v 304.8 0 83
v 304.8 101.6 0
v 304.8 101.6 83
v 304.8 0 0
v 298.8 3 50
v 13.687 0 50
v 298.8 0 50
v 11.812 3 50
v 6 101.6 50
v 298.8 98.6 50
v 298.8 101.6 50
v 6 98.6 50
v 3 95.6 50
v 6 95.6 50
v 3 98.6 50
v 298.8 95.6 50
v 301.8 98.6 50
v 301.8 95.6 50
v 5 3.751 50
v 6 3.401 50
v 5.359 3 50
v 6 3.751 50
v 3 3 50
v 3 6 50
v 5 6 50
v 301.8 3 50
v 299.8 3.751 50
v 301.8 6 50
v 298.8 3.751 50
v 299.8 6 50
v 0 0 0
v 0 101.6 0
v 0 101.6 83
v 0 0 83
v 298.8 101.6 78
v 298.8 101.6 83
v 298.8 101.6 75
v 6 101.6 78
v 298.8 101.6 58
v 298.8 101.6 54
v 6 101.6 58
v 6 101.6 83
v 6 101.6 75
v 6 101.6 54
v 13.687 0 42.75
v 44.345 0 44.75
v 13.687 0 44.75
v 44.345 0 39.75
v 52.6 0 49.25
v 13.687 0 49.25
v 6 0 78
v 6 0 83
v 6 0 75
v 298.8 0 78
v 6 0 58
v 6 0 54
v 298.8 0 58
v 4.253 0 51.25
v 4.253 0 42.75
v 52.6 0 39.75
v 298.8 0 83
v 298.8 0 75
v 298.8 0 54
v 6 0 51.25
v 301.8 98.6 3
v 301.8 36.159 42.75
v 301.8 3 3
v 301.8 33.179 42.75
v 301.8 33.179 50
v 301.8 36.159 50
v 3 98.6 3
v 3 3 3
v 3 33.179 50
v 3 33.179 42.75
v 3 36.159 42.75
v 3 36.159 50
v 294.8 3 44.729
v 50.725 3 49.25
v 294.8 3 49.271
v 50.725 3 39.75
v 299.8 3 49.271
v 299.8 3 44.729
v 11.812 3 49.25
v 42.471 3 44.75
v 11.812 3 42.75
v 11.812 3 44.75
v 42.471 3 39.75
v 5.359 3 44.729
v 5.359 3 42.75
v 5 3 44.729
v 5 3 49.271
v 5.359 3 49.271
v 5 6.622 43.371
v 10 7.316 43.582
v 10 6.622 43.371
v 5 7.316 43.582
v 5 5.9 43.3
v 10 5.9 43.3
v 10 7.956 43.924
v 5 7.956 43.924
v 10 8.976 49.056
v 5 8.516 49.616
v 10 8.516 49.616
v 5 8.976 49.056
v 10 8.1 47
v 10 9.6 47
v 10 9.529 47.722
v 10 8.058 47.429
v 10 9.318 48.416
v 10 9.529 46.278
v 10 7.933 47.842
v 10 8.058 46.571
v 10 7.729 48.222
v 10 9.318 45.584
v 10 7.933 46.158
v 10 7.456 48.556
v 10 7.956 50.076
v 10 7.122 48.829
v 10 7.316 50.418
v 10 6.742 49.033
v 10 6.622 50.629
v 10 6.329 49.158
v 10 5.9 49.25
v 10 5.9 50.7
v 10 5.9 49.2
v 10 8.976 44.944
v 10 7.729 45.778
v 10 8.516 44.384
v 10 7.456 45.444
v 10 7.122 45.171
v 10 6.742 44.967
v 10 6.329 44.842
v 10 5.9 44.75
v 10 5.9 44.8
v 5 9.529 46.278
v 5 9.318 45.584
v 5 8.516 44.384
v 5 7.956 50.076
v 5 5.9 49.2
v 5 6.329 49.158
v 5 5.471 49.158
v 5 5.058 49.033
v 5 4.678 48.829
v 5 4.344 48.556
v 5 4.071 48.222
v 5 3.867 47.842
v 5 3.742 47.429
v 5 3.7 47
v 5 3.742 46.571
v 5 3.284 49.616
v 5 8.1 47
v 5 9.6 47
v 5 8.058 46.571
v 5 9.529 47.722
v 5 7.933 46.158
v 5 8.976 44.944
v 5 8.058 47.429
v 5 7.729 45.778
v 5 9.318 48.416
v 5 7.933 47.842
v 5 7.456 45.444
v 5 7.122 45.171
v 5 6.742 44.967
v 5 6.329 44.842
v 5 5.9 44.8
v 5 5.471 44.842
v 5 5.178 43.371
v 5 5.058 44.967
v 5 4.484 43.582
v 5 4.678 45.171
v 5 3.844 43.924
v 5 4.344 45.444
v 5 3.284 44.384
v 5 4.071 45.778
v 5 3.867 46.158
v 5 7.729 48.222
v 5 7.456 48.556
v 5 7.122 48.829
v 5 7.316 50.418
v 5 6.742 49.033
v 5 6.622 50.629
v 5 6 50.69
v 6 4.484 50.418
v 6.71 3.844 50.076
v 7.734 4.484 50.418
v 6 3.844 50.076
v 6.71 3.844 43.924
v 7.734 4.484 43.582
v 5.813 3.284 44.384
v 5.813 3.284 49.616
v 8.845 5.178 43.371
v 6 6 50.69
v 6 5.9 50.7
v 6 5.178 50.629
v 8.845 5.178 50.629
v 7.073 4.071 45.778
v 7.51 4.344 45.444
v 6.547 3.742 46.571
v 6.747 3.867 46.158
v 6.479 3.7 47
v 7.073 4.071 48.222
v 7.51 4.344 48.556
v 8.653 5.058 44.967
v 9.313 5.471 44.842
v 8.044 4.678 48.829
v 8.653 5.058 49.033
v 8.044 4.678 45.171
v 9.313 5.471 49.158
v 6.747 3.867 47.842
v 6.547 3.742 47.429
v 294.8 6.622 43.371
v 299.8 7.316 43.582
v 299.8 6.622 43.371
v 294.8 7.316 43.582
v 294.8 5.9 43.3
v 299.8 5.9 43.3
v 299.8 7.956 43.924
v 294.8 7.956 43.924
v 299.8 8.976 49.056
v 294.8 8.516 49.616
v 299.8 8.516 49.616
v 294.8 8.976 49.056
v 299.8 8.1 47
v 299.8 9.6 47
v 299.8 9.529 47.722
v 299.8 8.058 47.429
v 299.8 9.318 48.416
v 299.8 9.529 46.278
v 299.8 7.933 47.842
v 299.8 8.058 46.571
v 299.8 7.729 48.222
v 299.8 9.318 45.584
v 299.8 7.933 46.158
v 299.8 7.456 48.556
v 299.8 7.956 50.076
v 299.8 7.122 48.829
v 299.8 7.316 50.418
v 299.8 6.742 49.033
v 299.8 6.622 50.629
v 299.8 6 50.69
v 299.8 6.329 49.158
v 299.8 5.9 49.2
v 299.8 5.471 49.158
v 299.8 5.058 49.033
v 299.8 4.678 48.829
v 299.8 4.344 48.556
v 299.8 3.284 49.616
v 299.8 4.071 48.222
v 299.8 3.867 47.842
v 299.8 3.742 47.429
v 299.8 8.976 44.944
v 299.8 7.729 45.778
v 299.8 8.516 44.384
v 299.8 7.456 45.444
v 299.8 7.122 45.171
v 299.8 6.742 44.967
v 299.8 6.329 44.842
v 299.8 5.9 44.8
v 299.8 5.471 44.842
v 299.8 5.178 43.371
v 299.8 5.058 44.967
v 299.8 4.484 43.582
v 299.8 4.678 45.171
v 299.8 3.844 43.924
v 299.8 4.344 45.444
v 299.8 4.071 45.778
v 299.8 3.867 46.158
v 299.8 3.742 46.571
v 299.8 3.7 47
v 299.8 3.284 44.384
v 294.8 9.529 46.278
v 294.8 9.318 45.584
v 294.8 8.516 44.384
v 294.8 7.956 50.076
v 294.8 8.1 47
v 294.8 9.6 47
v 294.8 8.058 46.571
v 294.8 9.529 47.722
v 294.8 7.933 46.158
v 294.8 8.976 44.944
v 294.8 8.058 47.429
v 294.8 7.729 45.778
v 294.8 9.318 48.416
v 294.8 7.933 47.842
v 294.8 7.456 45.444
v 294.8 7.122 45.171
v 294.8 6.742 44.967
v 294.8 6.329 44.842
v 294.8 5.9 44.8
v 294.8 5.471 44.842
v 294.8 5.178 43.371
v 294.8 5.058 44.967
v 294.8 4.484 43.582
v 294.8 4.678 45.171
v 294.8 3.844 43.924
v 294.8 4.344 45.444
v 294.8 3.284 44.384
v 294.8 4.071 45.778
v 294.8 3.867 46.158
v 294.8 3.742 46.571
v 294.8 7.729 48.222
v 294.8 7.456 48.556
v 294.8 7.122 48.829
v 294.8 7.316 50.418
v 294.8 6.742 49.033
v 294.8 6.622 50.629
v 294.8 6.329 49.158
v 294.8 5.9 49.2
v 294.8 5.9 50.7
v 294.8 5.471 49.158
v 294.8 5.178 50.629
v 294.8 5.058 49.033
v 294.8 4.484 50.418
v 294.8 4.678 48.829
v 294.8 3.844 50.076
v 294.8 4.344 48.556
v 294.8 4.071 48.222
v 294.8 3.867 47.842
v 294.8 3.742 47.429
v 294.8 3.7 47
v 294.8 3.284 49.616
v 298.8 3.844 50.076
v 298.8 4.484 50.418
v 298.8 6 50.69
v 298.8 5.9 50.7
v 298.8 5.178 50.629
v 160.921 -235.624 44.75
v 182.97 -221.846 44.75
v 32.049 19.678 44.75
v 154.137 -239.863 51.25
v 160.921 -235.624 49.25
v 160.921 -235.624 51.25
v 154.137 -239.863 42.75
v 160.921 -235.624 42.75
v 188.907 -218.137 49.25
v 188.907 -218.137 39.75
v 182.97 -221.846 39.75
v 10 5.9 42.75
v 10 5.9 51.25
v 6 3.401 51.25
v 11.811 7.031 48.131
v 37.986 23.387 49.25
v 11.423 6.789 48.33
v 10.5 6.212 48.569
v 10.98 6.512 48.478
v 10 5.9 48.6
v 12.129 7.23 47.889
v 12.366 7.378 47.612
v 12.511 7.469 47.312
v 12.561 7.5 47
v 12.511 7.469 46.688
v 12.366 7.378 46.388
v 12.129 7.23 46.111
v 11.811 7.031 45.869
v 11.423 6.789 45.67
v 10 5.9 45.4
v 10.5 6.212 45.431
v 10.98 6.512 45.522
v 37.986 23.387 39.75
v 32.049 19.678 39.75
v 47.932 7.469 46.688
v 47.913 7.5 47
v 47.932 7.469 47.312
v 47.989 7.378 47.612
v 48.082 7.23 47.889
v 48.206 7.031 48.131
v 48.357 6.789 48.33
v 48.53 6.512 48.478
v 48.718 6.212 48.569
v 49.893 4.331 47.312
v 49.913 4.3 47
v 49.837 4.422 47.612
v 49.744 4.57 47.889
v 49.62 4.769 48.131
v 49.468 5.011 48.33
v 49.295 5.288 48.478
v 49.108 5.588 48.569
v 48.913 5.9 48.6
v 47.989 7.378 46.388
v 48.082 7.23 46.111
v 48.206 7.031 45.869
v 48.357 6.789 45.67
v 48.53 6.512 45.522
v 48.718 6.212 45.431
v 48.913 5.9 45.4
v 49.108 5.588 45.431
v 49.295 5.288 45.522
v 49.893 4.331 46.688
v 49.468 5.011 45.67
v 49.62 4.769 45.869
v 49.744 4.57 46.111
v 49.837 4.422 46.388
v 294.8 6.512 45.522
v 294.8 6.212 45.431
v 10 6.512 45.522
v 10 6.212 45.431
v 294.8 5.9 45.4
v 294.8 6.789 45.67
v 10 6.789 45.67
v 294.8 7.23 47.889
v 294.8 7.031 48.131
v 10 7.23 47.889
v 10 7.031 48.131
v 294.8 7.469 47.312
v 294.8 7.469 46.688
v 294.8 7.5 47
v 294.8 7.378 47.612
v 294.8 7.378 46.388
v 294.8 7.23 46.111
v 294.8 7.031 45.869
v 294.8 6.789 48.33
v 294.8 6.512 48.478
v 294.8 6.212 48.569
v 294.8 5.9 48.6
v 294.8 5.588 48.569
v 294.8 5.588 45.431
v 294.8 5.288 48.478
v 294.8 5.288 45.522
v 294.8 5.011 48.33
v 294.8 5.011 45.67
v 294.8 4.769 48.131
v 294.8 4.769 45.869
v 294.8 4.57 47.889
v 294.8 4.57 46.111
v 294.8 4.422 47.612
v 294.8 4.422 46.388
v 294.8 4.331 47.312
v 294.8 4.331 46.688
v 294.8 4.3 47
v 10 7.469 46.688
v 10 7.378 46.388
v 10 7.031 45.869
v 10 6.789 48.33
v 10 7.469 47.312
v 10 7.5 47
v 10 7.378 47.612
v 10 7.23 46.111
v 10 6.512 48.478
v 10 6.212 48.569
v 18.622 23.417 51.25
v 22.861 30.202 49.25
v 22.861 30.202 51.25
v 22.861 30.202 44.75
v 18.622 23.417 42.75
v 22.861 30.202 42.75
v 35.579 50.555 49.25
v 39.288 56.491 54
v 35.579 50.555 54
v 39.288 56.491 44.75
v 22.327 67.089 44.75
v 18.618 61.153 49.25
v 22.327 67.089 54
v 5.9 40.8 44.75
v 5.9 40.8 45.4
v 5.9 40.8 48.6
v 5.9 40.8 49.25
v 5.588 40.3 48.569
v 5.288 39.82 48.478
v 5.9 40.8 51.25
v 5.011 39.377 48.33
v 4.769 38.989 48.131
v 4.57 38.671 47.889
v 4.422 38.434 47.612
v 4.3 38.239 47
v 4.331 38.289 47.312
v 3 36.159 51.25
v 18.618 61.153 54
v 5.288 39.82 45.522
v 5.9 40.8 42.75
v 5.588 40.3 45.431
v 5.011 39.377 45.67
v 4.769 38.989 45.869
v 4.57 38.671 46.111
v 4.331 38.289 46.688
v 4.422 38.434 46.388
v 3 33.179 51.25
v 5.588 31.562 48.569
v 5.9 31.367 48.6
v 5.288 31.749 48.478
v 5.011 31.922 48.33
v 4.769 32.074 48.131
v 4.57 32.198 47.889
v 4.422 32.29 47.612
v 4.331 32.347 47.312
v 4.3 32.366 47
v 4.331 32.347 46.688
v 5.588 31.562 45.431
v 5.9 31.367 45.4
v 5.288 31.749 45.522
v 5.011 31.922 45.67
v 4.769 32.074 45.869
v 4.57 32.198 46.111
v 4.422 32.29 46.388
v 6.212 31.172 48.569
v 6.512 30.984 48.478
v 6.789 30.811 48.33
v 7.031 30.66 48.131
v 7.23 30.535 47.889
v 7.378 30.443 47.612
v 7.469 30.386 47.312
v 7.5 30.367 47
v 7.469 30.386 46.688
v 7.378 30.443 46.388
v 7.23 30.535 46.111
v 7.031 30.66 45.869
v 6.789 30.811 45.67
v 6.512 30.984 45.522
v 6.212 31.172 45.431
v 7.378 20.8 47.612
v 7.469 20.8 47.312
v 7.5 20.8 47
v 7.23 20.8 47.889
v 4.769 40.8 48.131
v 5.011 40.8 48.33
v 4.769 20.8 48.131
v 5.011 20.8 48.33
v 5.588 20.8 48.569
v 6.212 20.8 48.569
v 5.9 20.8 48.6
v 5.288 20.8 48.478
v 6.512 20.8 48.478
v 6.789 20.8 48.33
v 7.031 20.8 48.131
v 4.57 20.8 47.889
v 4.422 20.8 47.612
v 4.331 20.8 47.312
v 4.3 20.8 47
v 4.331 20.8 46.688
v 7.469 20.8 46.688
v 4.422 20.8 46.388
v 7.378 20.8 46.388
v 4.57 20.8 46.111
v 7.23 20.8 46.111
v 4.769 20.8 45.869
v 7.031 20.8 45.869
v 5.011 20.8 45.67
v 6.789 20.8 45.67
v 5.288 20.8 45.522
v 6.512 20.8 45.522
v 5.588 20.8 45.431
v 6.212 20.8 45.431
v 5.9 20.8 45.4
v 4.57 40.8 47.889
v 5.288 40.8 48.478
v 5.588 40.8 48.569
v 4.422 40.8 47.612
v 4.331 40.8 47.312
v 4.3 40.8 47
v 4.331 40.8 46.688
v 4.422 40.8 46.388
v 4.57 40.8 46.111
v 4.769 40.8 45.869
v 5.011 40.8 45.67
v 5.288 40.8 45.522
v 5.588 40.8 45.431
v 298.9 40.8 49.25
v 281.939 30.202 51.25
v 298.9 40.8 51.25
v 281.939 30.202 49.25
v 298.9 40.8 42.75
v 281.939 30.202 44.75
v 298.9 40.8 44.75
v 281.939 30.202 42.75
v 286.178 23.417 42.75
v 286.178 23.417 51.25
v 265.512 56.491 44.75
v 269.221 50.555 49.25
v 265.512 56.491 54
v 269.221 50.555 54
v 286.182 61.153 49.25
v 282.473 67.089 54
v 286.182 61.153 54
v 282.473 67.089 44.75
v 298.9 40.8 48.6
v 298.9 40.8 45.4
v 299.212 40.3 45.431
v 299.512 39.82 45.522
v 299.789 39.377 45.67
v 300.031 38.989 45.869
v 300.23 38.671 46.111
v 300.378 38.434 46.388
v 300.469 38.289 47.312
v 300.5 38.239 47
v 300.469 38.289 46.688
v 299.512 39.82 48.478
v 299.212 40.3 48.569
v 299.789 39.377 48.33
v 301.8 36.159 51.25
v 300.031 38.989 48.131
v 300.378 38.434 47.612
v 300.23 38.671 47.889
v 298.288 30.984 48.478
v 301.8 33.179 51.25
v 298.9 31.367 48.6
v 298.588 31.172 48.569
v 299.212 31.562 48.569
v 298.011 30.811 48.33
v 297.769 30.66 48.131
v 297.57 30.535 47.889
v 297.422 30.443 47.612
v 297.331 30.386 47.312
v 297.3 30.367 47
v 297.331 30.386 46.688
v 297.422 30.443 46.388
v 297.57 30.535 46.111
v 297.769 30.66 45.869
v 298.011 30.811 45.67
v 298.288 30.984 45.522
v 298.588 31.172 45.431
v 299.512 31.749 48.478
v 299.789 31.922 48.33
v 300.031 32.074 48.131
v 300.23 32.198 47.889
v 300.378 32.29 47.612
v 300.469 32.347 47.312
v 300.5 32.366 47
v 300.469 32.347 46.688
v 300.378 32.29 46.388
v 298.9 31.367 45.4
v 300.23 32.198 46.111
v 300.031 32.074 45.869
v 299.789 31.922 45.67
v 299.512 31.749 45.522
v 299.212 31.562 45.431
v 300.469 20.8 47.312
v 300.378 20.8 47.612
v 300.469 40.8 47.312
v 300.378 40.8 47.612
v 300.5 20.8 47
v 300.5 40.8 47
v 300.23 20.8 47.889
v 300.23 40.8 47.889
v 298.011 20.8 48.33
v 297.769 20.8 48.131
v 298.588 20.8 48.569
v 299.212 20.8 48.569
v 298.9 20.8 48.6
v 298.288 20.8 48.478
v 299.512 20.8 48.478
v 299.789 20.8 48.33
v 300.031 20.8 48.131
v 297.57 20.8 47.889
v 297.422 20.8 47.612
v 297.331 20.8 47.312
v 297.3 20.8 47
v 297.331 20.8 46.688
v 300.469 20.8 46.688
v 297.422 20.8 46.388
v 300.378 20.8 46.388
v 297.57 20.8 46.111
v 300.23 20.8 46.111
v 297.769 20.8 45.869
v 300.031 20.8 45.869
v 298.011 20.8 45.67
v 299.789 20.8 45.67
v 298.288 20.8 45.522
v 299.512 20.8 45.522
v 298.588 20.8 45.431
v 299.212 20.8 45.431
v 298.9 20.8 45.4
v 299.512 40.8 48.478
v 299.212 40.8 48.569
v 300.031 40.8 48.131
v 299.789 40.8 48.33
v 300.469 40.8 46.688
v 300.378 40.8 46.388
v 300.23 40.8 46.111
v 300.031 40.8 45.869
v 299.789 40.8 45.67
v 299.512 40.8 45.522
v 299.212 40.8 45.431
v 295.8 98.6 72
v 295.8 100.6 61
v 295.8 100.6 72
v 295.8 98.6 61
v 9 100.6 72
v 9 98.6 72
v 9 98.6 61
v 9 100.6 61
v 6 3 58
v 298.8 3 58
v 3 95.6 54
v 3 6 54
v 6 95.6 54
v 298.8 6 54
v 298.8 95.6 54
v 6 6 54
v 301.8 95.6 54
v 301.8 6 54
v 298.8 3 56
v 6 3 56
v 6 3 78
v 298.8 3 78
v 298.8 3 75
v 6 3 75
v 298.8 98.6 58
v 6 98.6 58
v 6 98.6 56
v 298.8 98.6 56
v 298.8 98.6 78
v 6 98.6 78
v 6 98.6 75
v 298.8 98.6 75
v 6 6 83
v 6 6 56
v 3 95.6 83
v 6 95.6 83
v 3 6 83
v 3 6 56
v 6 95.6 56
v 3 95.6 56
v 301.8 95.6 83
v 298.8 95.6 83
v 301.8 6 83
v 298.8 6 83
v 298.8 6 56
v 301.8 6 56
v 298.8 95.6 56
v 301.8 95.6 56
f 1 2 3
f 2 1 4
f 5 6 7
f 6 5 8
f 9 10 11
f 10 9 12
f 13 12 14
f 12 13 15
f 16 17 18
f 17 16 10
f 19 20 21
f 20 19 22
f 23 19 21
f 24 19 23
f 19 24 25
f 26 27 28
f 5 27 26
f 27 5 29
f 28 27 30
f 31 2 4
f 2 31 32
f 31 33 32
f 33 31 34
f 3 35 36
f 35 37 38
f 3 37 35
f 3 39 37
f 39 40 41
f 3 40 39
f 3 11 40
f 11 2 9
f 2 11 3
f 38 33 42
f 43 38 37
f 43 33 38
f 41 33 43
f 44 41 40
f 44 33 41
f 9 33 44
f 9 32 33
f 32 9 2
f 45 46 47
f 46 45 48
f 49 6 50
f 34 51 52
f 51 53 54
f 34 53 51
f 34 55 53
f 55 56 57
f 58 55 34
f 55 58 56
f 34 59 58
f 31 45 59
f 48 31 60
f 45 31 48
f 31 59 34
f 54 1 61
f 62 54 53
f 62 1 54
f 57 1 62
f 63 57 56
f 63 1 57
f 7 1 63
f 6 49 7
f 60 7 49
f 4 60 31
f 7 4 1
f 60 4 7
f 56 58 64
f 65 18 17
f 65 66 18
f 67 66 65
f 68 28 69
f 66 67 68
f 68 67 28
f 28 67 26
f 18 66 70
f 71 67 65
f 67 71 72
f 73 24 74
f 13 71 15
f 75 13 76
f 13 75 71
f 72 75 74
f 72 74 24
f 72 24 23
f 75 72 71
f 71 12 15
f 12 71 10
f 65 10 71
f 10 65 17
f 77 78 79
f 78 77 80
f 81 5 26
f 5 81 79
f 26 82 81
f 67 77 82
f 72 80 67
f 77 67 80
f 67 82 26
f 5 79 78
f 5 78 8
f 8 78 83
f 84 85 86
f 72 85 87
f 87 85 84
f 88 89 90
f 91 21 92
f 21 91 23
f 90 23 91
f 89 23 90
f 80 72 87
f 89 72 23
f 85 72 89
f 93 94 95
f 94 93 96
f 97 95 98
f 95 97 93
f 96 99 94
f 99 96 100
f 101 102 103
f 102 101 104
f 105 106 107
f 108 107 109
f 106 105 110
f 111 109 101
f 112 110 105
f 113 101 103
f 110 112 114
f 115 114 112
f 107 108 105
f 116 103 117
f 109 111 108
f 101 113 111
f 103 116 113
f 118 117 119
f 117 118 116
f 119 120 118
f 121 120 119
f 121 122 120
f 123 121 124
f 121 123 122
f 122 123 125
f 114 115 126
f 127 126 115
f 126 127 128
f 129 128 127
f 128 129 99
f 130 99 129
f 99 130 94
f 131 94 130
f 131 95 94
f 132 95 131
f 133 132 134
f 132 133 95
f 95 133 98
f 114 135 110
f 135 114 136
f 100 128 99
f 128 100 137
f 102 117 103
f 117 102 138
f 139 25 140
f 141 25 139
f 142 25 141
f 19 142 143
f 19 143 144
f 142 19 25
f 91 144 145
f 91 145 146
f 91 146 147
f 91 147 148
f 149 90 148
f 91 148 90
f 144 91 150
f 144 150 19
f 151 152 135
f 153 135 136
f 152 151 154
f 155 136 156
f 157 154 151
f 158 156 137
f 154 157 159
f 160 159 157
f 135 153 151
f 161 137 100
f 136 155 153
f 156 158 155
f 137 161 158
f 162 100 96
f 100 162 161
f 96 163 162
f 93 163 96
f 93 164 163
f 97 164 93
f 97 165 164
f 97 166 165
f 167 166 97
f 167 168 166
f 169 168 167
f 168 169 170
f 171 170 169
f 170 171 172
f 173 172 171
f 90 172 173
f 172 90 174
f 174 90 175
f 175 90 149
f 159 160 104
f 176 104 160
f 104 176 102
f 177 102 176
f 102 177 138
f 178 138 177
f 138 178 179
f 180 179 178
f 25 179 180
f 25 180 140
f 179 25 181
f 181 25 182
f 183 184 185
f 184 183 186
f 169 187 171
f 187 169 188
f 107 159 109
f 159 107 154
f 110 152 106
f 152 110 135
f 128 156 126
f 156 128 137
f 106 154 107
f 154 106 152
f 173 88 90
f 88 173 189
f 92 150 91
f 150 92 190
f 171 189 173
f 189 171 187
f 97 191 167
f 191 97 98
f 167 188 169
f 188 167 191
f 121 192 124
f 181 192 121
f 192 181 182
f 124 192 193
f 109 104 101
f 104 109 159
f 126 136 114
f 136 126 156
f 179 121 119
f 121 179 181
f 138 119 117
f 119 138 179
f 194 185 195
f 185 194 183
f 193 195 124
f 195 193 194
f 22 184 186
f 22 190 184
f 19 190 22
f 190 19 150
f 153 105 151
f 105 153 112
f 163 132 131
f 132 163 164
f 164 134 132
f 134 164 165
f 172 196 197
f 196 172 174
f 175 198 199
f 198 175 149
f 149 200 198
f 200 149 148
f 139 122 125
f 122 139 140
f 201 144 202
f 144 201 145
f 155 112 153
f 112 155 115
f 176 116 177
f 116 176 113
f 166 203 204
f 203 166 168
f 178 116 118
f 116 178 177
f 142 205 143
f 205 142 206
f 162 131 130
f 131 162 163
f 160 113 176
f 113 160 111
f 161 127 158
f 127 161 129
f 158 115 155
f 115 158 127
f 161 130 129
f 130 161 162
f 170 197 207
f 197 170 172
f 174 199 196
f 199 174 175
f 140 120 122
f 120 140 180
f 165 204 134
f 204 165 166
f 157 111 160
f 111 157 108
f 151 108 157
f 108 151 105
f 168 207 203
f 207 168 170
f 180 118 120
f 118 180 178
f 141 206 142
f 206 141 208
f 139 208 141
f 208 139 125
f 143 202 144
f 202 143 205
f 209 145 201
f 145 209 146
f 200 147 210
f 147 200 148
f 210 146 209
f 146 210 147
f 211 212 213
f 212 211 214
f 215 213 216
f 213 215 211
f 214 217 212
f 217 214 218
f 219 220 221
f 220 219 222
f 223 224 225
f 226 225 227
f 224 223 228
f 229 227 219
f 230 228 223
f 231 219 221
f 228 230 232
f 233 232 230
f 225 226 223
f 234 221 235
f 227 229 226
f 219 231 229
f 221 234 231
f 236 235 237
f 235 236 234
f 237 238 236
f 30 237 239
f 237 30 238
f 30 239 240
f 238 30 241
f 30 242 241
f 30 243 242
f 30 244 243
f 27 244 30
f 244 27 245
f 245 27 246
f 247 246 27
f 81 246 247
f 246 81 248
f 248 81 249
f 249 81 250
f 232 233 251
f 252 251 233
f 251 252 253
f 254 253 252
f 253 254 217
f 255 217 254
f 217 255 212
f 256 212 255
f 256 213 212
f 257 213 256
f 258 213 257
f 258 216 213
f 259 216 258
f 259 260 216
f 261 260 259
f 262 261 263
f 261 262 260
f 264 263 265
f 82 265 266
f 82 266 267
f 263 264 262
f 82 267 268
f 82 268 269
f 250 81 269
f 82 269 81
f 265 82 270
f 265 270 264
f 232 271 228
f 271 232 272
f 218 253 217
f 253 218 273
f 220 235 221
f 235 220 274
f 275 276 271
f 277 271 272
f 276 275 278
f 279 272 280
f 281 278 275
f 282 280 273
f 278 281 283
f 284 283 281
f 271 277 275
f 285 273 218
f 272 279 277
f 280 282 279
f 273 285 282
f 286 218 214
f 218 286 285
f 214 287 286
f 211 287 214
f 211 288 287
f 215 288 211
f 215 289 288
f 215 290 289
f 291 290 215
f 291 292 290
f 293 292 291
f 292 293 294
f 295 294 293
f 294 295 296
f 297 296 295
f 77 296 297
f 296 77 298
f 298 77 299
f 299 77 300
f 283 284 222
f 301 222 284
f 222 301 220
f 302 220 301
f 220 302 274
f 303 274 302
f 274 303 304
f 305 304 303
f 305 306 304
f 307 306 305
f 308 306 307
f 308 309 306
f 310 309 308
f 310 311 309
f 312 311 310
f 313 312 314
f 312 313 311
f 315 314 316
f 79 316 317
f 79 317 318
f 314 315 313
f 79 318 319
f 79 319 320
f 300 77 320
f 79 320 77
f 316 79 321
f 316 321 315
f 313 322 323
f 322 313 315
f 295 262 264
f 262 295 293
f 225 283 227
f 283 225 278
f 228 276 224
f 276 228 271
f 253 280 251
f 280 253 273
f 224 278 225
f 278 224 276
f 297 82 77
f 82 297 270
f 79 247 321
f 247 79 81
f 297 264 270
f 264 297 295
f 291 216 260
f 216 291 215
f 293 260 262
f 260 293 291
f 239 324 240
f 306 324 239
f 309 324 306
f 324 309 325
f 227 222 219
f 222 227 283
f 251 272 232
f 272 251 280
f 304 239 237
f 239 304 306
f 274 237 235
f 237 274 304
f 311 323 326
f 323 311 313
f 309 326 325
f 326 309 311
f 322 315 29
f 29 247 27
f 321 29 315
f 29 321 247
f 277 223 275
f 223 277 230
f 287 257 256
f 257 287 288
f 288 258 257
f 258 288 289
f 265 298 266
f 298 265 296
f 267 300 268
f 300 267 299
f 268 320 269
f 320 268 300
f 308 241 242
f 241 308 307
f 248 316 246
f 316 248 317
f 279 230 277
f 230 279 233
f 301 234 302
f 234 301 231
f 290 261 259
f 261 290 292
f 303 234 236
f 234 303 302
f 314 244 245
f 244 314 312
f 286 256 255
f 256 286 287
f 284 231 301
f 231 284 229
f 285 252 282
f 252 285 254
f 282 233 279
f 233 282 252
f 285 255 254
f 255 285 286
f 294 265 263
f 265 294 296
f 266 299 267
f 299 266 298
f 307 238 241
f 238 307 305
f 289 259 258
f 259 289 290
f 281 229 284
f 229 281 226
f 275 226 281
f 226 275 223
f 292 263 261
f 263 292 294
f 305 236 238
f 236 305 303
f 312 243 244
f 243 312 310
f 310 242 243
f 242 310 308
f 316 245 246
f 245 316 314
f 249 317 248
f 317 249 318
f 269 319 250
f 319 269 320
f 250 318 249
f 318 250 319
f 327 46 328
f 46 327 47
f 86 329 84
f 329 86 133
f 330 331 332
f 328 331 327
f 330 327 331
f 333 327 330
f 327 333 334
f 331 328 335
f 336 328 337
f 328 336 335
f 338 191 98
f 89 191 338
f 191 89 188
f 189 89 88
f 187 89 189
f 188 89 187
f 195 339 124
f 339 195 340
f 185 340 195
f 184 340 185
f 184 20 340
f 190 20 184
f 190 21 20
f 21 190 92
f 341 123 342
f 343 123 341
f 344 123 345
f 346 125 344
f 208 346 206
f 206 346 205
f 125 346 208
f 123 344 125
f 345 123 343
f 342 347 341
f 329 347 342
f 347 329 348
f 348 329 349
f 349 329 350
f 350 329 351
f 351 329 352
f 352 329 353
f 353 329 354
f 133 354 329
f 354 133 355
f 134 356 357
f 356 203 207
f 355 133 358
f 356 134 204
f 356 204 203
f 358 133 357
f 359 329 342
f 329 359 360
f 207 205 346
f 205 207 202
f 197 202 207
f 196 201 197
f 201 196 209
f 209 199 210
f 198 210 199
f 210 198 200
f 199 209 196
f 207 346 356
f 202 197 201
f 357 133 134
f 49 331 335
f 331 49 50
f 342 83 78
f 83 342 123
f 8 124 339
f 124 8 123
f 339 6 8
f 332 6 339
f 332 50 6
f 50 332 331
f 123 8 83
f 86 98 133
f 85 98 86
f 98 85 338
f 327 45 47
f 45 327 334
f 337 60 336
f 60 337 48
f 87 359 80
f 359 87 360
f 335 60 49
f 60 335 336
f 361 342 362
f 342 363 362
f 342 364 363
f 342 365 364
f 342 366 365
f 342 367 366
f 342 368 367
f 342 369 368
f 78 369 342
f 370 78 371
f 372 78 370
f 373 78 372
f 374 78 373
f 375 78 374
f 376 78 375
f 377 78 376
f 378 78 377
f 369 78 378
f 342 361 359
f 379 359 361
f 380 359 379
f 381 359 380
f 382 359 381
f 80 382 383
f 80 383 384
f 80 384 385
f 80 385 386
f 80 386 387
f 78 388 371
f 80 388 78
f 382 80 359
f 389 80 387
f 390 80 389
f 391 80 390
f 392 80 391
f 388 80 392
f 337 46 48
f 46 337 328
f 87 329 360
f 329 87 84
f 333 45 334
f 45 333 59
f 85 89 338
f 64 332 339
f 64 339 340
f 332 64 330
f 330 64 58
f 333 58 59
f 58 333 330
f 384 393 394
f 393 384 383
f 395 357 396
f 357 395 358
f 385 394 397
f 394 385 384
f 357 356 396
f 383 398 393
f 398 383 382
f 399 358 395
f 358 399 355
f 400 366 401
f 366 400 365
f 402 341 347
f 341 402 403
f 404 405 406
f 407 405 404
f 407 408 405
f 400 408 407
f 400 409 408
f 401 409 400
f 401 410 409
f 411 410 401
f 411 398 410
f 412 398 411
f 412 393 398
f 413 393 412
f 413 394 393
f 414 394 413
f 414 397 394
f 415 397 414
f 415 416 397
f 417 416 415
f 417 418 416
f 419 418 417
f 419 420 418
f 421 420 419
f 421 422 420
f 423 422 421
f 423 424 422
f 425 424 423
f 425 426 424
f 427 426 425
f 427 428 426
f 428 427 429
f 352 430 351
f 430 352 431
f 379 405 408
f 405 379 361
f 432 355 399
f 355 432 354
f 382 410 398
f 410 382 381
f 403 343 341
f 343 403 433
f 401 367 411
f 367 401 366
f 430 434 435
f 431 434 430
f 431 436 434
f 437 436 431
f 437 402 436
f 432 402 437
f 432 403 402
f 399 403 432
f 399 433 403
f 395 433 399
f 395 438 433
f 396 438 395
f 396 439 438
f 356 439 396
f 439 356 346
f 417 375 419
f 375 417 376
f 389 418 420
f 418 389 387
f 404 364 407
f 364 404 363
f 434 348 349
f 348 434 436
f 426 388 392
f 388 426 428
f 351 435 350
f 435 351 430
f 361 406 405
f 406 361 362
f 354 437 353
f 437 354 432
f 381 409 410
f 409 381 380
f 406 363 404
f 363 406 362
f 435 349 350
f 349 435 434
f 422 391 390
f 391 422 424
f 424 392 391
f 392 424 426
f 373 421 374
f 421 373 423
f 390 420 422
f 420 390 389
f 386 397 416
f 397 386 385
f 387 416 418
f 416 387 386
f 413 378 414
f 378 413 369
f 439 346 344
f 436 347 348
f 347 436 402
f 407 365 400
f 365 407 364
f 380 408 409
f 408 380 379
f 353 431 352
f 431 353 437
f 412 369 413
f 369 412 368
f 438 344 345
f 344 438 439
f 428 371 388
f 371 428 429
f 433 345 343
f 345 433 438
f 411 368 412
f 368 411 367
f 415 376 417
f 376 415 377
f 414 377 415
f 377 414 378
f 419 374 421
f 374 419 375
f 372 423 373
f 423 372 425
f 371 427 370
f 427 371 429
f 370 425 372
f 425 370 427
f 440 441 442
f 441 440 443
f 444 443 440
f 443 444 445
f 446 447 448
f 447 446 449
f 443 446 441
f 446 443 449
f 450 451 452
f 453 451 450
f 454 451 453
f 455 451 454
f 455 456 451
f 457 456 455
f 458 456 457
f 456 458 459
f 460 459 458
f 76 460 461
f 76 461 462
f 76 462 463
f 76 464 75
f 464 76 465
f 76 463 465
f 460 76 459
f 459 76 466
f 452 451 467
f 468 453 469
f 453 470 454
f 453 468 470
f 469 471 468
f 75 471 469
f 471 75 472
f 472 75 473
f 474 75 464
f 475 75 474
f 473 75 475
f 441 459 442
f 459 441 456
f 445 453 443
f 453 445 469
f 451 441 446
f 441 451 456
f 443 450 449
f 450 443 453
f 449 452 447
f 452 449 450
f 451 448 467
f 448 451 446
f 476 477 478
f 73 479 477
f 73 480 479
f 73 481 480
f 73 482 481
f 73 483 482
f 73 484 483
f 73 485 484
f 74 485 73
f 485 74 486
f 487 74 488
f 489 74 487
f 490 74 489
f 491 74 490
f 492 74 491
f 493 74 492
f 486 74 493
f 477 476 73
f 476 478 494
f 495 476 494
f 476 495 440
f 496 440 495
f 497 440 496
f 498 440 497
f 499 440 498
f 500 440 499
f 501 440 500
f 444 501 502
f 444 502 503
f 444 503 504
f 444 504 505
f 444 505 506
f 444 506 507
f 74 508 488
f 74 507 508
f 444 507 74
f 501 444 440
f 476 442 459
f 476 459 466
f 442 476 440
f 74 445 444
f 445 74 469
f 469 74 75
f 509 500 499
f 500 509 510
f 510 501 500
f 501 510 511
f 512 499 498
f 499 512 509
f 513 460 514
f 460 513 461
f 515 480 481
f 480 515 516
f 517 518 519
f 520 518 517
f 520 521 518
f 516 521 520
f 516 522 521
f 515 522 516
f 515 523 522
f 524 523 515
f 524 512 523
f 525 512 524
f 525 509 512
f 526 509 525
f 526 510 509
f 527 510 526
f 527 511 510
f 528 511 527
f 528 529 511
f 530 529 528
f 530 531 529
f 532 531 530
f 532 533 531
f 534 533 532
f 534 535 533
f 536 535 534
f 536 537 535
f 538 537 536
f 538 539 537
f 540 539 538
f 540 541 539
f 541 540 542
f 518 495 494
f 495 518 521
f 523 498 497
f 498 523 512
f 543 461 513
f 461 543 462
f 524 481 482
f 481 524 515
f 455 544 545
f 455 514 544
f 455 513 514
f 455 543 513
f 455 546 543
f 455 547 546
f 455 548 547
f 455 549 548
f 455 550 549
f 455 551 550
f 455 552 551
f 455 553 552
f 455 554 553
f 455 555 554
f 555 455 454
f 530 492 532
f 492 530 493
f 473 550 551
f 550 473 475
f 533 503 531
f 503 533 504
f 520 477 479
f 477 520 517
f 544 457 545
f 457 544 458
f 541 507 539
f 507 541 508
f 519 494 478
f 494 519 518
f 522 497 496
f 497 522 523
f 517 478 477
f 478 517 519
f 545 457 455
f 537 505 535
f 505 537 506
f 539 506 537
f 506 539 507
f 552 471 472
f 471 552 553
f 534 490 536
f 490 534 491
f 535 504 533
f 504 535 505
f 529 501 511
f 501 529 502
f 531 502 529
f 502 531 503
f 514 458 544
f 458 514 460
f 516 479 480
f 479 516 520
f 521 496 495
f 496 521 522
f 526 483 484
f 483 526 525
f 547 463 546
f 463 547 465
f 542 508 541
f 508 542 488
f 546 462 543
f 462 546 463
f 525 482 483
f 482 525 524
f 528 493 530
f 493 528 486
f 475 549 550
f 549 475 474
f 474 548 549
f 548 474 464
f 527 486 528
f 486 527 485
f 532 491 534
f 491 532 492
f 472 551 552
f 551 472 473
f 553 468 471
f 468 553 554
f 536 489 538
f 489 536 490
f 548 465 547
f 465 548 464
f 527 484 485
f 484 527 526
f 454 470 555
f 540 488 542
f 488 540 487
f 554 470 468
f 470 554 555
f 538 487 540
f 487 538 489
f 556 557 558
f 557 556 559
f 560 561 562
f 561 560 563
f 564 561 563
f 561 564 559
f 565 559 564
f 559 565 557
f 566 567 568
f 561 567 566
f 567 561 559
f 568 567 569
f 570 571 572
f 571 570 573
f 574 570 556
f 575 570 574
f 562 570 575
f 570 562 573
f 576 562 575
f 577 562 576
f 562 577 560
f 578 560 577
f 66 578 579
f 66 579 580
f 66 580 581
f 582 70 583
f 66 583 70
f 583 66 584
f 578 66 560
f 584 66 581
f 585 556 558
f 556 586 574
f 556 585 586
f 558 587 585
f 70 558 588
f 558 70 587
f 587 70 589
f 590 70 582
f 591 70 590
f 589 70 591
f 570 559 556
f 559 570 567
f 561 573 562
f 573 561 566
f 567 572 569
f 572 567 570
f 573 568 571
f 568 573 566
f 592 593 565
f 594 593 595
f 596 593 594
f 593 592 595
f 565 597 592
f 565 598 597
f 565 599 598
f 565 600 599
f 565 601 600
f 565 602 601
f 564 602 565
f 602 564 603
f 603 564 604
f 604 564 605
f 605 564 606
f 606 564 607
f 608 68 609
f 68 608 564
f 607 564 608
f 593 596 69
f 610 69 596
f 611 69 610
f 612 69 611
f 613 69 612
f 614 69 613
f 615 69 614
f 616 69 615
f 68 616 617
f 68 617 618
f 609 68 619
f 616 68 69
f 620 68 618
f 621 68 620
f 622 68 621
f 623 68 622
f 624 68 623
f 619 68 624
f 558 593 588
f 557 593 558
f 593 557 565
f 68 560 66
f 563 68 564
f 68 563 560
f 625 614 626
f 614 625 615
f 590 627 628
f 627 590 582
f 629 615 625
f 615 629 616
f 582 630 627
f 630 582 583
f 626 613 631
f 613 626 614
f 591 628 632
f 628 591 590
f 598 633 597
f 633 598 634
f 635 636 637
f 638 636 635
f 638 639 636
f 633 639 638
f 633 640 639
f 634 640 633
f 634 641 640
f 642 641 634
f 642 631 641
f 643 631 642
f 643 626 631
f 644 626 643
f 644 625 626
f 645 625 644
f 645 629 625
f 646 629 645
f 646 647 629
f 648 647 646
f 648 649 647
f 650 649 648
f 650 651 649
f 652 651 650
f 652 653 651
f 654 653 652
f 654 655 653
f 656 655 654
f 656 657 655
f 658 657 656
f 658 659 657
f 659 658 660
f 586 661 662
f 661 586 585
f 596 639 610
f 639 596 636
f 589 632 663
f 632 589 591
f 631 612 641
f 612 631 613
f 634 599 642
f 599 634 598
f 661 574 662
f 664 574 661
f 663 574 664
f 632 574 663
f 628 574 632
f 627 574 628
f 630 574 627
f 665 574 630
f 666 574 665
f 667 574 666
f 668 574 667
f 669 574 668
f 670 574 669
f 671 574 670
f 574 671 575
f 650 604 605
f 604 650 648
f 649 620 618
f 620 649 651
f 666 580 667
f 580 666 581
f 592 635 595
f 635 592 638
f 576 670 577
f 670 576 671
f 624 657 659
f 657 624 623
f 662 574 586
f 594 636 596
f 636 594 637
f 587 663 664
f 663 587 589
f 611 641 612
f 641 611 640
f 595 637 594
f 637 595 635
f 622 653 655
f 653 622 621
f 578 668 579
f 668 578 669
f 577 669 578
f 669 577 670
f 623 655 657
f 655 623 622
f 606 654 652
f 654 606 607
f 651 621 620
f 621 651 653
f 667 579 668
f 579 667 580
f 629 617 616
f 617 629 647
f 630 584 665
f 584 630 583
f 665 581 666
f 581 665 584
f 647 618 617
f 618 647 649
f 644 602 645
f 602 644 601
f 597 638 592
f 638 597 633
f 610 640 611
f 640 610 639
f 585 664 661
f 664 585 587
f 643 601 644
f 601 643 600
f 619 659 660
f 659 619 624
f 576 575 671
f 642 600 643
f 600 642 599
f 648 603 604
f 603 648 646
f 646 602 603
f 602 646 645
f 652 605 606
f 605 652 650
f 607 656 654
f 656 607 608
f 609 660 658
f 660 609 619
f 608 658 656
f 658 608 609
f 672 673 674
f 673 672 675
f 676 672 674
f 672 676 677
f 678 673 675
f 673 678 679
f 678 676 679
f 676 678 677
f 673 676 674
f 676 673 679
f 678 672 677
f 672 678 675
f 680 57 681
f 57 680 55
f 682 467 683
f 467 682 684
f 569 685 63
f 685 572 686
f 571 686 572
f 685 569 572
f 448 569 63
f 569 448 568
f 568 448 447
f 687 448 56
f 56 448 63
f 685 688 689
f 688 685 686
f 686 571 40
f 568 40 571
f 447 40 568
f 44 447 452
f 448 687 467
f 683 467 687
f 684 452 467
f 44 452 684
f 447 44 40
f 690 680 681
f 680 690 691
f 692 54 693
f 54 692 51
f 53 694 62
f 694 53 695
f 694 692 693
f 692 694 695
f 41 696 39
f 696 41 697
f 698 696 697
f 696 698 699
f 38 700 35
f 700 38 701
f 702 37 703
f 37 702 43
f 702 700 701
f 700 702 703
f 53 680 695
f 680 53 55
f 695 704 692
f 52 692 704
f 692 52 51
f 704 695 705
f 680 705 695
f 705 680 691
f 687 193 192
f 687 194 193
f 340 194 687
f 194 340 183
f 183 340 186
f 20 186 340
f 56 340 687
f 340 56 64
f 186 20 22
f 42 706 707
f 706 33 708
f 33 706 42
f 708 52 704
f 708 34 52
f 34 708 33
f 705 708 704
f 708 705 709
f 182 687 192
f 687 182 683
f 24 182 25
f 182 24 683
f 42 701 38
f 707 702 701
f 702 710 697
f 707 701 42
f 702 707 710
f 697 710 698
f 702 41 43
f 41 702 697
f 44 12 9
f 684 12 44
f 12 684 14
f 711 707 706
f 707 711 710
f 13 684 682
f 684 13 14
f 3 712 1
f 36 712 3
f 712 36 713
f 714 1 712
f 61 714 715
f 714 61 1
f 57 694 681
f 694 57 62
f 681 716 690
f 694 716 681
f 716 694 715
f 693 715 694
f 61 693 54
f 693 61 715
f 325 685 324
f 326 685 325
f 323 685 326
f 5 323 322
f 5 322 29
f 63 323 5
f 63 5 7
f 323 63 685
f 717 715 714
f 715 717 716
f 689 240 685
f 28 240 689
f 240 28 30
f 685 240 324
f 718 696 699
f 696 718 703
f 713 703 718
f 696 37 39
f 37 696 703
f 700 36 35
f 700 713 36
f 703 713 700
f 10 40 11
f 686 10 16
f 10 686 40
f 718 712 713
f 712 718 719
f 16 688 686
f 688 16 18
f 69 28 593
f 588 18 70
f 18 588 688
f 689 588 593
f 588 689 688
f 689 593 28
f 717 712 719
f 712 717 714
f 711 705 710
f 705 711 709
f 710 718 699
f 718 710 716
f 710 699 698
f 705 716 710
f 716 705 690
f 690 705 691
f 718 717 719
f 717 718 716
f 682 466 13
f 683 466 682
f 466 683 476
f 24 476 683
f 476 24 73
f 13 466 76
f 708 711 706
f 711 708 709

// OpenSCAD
// file: ../top_ref.scad
// top_ref.scad  — FAITHFUL reference of the real uploaded top tray (L3.stl)
// Extracted from L3.stl by voxel analysis. Coordinates: new-tray top face = z=0 here,
// call top_ref(base=50) to seat it on a 50mm-tall new tray.
// DO NOT MODIFY THIS PART IN ANY DESIGN — it represents an already-printed tray.
//
// Real dims: 304.8 (X) x 101.6 (Y) x 33 (Z).
//  - END walls (short, x=0..3 and 301.8..304.8): SOLID full height -> top at z=33 (seated 83)
//  - LONG sides (front y=0..3, back y=98.6..101.6): OPEN FRAME
//        bottom rail z=4..8, top rail z=25..28, OPEN between (z=9..24)
//        side top edge at z=28 (seated 78)
//  - Corners: full height to z=33 (seated 83)
//  - Floor plate: z=4..6
// Seated mapping (base=50): add 50 to every z below.

TR_X = 304.8;
TR_Y = 101.6;
TR_Z = 33;
TR_wall = 3;        // side/end wall thickness
TR_endw = 3;        // short-end wall thickness
TR_botrail_z0 = 4;  TR_botrail_z1 = 8;     // long-side bottom rail
TR_toprail_z0 = 25; TR_toprail_z1 = 28;    // long-side top rail (side top edge=28)
TR_floor_z0 = 4;    TR_floor_z1 = 6;
TR_corner = 6;      // corner post footprint (x & y) kept full height

module top_ref(base=50, col="#90A4AE", alpha=1.0) {
    color(col, alpha)
    translate([0,0,base])
    union() {
        // ---- floor plate ----
        translate([TR_endw, TR_wall, TR_floor_z0])
            cube([TR_X-2*TR_endw, TR_Y-2*TR_wall, TR_floor_z1-TR_floor_z0]);
        // ---- two short END walls: full height ----
        cube([TR_endw, TR_Y, TR_Z]);
        translate([TR_X-TR_endw,0,0]) cube([TR_endw, TR_Y, TR_Z]);
        // ---- long-side OPEN FRAMES (front & back) ----
        for (yy=[0, TR_Y-TR_wall]) {
            // bottom rail
            translate([0, yy, TR_botrail_z0]) cube([TR_X, TR_wall, TR_botrail_z1-TR_botrail_z0]);
            // top rail (side top edge)
            translate([0, yy, TR_toprail_z0]) cube([TR_X, TR_wall, TR_toprail_z1-TR_toprail_z0]);
        }
        // ---- corner posts full height (tie frames together, reach z=33) ----
        for (xx=[0, TR_X-TR_corner], yy=[0, TR_Y-TR_corner])
            translate([xx,yy,0]) cube([TR_corner, TR_corner, TR_Z]);
    }
}

// Convenience constants a design can reference (seated, base=50):
//   END-wall top edge:        z = 50+33 = 83  (over the short ends -> strong clamp)
//   Long-side top rail top:   z = 50+28 = 78  (hook over / under along front)
//   Long-side open slot:      z = 50+9 .. 50+24 = 59..74 (reach a tongue in anywhere)
//   Corner top:               z = 83
// main file
// 01_frontbar_endclamps.scad
// Variant 1: Full-length front flip-bar + two end flip-clamps
// Place-then-secure: top tray drops straight down ~0.6mm loose,
// then flip levers up-and-in to lock.
//
// New tray: 304.8(X) x 101.6(Y) x 50(Z), walls 3mm, open top
// Top tray seated at z=50 (origin = new tray front-left-bottom):
//   End walls top z=83, front top-rail z=75..78, slot z=59..74

show  = "all"; // [all,new,top]
lock  = 1;     // 0=open, 1=closed

include <../top_ref.scad>

// ---- Tray constants -------------------------------------------------------
NT_X = 304.8;
NT_Y = 101.6;
NT_Z = 50;
NT_W = 3;

// Seated top-tray geometry
END_TOP_Z      = 83;   // short end walls top z
FRONT_RAIL_TOP = 78;   // front long-side top rail top
FRONT_RAIL_BOT = 75;
BACK_RAIL_TOP  = 78;
SLOT_TOP       = 74;
SLOT_BOT       = 59;

// ---- Hinge / lever params ------------------------------------------------
H_R   = 2.2;   // hinge bore radius (on tray)
H_PIN = 1.6;   // hinge pin radius (on lever, H_PIN < H_R - 0.4)
H_CLR = 0.4;   // radial clearance

LEVER_T = 4.5; // lever arm thickness (Y direction for front, X for end)
LIP_H   = 7.0; // lip height
LIP_D   = 5.0; // lip overhang depth

// Front bar: hinge along X, runs full length minus corner pockets
FB_X0 = 10;
FB_X1 = NT_X - 10;
FB_LEN = FB_X1 - FB_X0; // 284.8 mm

// Hinge position: on front wall (y~0 face), pin axis at y=H_R+0.5, z chosen
// so lever tip clears lift path when open (folds DOWN against y<0 space)
// and captures front rail at z=75..78 when closed
// Hinge z: we want open lever to stay z<=50 (folded down)
// closed: lever arm swings up-and-in; tip reaches z=front_rail_top
// Let hinge be at z=47 (3mm below new tray top), arm length ~28mm
// closed angle ~55° inward -> tip_z ~ 47 + 28*sin(55) ~ 47+23 = 70 -> ok for hooking rail

FB_HINGE_Z = 47;  // z of hinge axis
FB_HINGE_Y = NT_W + H_R + H_CLR + 0.3;  // ~6mm from front face
FB_ARM_L   = 28;  // arm length from hinge to lip root
OPEN_A  = -90; // open: folded straight down (below hinge)
CLOSE_A =  58; // closed: flipped up-and-in

// End clamps
EC_HINGE_Z   = 47;
EC_HINGE_Y0  = (NT_Y - 20) / 2;  // centered in Y
EC_W         = 20;    // clamp width in Y
EC_ARM_L     = 26;    // arm length from hinge
EC_HINGE_X_L = NT_W + H_R + H_CLR + 0.3;
EC_HINGE_X_R = NT_X - NT_W - H_R - H_CLR - 0.3;

function la(lk) = lk ? CLOSE_A : OPEN_A;

// ============================================================================
// NEW TRAY
// ============================================================================
module new_tray() {
    color("#1565C0")
    difference() {
        cube([NT_X, NT_Y, NT_Z]);
        // hollow (open top)
        translate([NT_W, NT_W, NT_W])
            cube([NT_X - 2*NT_W, NT_Y - 2*NT_W, NT_Z]);
    }
}

// ============================================================================
// FRONT BAR HINGE BOSSES (fixed on tray, part of new_tray geometry)
// Axis along X. Two short boss cylinders flanking the bar.
// ============================================================================
module front_hinge_bosses() {
    color("#1565C0")
    translate([0, FB_HINGE_Y, FB_HINGE_Z])
    rotate([0, 90, 0]) {
        // Left boss (at x=FB_X0-4..FB_X0)
        translate([0, 0, FB_X0 - 5])
            difference() {
                cylinder(h=5, r=H_R + 1.5, $fn=32);
                cylinder(h=5, r=H_R, $fn=32);
            }
        // Right boss (at x=FB_X1..FB_X1+5)
        translate([0, 0, FB_X1])
            difference() {
                cylinder(h=5, r=H_R + 1.5, $fn=32);
                cylinder(h=5, r=H_R, $fn=32);
            }
    }
}

// ============================================================================
// FRONT FLIP BAR
// Hinge pin along X axis. When open: arm folds straight DOWN (angle=-90).
// When closed: arm sweeps up-and-in (~58°) so lip captures front top rail.
// ============================================================================
module front_bar(lk) {
    ang = la(lk);
    color("#2E7D32")
    translate([FB_X0, FB_HINGE_Y, FB_HINGE_Z])
    rotate([0, 90, 0])  // now X is the hinge axis
    {
        // Pin runs along hinge axis (now local Z) for full bar length
        cylinder(h=FB_LEN, r=H_PIN, $fn=32);
        // Bar body: rotate about hinge axis
        rotate([ang, 0, 0])
        {
            // Main arm slab: extends from hinge outward
            // Local coords: Z=along bar, Y=arm direction, X=thickness
            translate([-LEVER_T/2, 0, 0])
                cube([LEVER_T, FB_ARM_L, FB_LEN]);
            // Lip at tip: hooks OVER front top rail (from above at z=78)
            // Extends inward (+Y local = inward toward tray when closed)
            translate([-LEVER_T/2, FB_ARM_L - 2, 0])
                cube([LEVER_T + LIP_D, LIP_H, FB_LEN]);
            // Finger tab (outward, -Y local = toward front when closed)
            translate([-LEVER_T/2 - 2, -8, 0])
                cube([LEVER_T + 4, 8, FB_LEN]);
        }
    }
}

// ============================================================================
// END CLAMP - LEFT (at x=0 short wall)
// Hinge axis along Y. When open: folds down/out (-x direction, angle=-90).
// When closed: sweeps in (+x, over end wall top at z=83).
// ============================================================================
module end_clamp_left(lk) {
    ang = la(lk);
    color("#EF6C00")
    translate([EC_HINGE_X_L, EC_HINGE_Y0, EC_HINGE_Z])
    rotate([90, 0, 0])  // hinge axis along Y
    {
        // pin
        cylinder(h=EC_W, r=H_PIN, $fn=32);
        // arm body
        rotate([0, ang, 0])
        {
            translate([0, -LEVER_T/2, 0])
                cube([EC_ARM_L, LEVER_T, EC_W]);
            // lip hooking over end wall top z=83
            translate([EC_ARM_L - 2, -LEVER_T/2, 0])
                cube([LIP_H, LEVER_T + LIP_D, EC_W]);
            // finger tab
            translate([-8, -LEVER_T/2 - 2, 0])
                cube([8, LEVER_T + 4, EC_W]);
        }
    }
}

// ============================================================================
// END CLAMP - RIGHT (at x=NT_X short wall)
// Mirror of left.
// ============================================================================
module end_clamp_right(lk) {
    ang = la(lk);
    color("#EF6C00")
    translate([EC_HINGE_X_R, EC_HINGE_Y0, EC_HINGE_Z])
    rotate([90, 0, 0])
    {
        cylinder(h=EC_W, r=H_PIN, $fn=32);
        rotate([0, -ang, 0])
        {
            translate([-EC_ARM_L, -LEVER_T/2, 0])
                cube([EC_ARM_L, LEVER_T, EC_W]);
            translate([-EC_ARM_L - LIP_H + 2, -LEVER_T/2, 0])
                cube([LIP_H, LEVER_T + LIP_D, EC_W]);
            translate([0, -LEVER_T/2 - 2, 0])
                cube([8, LEVER_T + 4, EC_W]);
        }
    }
}

// ============================================================================
// BACK PASSIVE TONGUE (flush in back slot y=98.6..101.6, slot z=59..74)
// Just a slim tongue on the back wall that slides into the open slot.
// Stays within y<=101.6, acts as a passive guide/backstop.
// ============================================================================
module back_tongue() {
    color("#1565C0", 0.8)
    translate([NT_W + 6, NT_Y - NT_W, SLOT_BOT + 2])
        cube([NT_X - 2*NT_W - 12, 2, (SLOT_TOP - SLOT_BOT) - 4]);
}

// ============================================================================
// ASSEMBLY
// ============================================================================
module new_assembly(lk=1) {
    new_tray();
    front_hinge_bosses();
    front_bar(lk);
    end_clamp_left(lk);
    end_clamp_right(lk);
    back_tongue();
}

if (show != "top") new_assembly(lock);
if (show != "new") top_ref(50);
